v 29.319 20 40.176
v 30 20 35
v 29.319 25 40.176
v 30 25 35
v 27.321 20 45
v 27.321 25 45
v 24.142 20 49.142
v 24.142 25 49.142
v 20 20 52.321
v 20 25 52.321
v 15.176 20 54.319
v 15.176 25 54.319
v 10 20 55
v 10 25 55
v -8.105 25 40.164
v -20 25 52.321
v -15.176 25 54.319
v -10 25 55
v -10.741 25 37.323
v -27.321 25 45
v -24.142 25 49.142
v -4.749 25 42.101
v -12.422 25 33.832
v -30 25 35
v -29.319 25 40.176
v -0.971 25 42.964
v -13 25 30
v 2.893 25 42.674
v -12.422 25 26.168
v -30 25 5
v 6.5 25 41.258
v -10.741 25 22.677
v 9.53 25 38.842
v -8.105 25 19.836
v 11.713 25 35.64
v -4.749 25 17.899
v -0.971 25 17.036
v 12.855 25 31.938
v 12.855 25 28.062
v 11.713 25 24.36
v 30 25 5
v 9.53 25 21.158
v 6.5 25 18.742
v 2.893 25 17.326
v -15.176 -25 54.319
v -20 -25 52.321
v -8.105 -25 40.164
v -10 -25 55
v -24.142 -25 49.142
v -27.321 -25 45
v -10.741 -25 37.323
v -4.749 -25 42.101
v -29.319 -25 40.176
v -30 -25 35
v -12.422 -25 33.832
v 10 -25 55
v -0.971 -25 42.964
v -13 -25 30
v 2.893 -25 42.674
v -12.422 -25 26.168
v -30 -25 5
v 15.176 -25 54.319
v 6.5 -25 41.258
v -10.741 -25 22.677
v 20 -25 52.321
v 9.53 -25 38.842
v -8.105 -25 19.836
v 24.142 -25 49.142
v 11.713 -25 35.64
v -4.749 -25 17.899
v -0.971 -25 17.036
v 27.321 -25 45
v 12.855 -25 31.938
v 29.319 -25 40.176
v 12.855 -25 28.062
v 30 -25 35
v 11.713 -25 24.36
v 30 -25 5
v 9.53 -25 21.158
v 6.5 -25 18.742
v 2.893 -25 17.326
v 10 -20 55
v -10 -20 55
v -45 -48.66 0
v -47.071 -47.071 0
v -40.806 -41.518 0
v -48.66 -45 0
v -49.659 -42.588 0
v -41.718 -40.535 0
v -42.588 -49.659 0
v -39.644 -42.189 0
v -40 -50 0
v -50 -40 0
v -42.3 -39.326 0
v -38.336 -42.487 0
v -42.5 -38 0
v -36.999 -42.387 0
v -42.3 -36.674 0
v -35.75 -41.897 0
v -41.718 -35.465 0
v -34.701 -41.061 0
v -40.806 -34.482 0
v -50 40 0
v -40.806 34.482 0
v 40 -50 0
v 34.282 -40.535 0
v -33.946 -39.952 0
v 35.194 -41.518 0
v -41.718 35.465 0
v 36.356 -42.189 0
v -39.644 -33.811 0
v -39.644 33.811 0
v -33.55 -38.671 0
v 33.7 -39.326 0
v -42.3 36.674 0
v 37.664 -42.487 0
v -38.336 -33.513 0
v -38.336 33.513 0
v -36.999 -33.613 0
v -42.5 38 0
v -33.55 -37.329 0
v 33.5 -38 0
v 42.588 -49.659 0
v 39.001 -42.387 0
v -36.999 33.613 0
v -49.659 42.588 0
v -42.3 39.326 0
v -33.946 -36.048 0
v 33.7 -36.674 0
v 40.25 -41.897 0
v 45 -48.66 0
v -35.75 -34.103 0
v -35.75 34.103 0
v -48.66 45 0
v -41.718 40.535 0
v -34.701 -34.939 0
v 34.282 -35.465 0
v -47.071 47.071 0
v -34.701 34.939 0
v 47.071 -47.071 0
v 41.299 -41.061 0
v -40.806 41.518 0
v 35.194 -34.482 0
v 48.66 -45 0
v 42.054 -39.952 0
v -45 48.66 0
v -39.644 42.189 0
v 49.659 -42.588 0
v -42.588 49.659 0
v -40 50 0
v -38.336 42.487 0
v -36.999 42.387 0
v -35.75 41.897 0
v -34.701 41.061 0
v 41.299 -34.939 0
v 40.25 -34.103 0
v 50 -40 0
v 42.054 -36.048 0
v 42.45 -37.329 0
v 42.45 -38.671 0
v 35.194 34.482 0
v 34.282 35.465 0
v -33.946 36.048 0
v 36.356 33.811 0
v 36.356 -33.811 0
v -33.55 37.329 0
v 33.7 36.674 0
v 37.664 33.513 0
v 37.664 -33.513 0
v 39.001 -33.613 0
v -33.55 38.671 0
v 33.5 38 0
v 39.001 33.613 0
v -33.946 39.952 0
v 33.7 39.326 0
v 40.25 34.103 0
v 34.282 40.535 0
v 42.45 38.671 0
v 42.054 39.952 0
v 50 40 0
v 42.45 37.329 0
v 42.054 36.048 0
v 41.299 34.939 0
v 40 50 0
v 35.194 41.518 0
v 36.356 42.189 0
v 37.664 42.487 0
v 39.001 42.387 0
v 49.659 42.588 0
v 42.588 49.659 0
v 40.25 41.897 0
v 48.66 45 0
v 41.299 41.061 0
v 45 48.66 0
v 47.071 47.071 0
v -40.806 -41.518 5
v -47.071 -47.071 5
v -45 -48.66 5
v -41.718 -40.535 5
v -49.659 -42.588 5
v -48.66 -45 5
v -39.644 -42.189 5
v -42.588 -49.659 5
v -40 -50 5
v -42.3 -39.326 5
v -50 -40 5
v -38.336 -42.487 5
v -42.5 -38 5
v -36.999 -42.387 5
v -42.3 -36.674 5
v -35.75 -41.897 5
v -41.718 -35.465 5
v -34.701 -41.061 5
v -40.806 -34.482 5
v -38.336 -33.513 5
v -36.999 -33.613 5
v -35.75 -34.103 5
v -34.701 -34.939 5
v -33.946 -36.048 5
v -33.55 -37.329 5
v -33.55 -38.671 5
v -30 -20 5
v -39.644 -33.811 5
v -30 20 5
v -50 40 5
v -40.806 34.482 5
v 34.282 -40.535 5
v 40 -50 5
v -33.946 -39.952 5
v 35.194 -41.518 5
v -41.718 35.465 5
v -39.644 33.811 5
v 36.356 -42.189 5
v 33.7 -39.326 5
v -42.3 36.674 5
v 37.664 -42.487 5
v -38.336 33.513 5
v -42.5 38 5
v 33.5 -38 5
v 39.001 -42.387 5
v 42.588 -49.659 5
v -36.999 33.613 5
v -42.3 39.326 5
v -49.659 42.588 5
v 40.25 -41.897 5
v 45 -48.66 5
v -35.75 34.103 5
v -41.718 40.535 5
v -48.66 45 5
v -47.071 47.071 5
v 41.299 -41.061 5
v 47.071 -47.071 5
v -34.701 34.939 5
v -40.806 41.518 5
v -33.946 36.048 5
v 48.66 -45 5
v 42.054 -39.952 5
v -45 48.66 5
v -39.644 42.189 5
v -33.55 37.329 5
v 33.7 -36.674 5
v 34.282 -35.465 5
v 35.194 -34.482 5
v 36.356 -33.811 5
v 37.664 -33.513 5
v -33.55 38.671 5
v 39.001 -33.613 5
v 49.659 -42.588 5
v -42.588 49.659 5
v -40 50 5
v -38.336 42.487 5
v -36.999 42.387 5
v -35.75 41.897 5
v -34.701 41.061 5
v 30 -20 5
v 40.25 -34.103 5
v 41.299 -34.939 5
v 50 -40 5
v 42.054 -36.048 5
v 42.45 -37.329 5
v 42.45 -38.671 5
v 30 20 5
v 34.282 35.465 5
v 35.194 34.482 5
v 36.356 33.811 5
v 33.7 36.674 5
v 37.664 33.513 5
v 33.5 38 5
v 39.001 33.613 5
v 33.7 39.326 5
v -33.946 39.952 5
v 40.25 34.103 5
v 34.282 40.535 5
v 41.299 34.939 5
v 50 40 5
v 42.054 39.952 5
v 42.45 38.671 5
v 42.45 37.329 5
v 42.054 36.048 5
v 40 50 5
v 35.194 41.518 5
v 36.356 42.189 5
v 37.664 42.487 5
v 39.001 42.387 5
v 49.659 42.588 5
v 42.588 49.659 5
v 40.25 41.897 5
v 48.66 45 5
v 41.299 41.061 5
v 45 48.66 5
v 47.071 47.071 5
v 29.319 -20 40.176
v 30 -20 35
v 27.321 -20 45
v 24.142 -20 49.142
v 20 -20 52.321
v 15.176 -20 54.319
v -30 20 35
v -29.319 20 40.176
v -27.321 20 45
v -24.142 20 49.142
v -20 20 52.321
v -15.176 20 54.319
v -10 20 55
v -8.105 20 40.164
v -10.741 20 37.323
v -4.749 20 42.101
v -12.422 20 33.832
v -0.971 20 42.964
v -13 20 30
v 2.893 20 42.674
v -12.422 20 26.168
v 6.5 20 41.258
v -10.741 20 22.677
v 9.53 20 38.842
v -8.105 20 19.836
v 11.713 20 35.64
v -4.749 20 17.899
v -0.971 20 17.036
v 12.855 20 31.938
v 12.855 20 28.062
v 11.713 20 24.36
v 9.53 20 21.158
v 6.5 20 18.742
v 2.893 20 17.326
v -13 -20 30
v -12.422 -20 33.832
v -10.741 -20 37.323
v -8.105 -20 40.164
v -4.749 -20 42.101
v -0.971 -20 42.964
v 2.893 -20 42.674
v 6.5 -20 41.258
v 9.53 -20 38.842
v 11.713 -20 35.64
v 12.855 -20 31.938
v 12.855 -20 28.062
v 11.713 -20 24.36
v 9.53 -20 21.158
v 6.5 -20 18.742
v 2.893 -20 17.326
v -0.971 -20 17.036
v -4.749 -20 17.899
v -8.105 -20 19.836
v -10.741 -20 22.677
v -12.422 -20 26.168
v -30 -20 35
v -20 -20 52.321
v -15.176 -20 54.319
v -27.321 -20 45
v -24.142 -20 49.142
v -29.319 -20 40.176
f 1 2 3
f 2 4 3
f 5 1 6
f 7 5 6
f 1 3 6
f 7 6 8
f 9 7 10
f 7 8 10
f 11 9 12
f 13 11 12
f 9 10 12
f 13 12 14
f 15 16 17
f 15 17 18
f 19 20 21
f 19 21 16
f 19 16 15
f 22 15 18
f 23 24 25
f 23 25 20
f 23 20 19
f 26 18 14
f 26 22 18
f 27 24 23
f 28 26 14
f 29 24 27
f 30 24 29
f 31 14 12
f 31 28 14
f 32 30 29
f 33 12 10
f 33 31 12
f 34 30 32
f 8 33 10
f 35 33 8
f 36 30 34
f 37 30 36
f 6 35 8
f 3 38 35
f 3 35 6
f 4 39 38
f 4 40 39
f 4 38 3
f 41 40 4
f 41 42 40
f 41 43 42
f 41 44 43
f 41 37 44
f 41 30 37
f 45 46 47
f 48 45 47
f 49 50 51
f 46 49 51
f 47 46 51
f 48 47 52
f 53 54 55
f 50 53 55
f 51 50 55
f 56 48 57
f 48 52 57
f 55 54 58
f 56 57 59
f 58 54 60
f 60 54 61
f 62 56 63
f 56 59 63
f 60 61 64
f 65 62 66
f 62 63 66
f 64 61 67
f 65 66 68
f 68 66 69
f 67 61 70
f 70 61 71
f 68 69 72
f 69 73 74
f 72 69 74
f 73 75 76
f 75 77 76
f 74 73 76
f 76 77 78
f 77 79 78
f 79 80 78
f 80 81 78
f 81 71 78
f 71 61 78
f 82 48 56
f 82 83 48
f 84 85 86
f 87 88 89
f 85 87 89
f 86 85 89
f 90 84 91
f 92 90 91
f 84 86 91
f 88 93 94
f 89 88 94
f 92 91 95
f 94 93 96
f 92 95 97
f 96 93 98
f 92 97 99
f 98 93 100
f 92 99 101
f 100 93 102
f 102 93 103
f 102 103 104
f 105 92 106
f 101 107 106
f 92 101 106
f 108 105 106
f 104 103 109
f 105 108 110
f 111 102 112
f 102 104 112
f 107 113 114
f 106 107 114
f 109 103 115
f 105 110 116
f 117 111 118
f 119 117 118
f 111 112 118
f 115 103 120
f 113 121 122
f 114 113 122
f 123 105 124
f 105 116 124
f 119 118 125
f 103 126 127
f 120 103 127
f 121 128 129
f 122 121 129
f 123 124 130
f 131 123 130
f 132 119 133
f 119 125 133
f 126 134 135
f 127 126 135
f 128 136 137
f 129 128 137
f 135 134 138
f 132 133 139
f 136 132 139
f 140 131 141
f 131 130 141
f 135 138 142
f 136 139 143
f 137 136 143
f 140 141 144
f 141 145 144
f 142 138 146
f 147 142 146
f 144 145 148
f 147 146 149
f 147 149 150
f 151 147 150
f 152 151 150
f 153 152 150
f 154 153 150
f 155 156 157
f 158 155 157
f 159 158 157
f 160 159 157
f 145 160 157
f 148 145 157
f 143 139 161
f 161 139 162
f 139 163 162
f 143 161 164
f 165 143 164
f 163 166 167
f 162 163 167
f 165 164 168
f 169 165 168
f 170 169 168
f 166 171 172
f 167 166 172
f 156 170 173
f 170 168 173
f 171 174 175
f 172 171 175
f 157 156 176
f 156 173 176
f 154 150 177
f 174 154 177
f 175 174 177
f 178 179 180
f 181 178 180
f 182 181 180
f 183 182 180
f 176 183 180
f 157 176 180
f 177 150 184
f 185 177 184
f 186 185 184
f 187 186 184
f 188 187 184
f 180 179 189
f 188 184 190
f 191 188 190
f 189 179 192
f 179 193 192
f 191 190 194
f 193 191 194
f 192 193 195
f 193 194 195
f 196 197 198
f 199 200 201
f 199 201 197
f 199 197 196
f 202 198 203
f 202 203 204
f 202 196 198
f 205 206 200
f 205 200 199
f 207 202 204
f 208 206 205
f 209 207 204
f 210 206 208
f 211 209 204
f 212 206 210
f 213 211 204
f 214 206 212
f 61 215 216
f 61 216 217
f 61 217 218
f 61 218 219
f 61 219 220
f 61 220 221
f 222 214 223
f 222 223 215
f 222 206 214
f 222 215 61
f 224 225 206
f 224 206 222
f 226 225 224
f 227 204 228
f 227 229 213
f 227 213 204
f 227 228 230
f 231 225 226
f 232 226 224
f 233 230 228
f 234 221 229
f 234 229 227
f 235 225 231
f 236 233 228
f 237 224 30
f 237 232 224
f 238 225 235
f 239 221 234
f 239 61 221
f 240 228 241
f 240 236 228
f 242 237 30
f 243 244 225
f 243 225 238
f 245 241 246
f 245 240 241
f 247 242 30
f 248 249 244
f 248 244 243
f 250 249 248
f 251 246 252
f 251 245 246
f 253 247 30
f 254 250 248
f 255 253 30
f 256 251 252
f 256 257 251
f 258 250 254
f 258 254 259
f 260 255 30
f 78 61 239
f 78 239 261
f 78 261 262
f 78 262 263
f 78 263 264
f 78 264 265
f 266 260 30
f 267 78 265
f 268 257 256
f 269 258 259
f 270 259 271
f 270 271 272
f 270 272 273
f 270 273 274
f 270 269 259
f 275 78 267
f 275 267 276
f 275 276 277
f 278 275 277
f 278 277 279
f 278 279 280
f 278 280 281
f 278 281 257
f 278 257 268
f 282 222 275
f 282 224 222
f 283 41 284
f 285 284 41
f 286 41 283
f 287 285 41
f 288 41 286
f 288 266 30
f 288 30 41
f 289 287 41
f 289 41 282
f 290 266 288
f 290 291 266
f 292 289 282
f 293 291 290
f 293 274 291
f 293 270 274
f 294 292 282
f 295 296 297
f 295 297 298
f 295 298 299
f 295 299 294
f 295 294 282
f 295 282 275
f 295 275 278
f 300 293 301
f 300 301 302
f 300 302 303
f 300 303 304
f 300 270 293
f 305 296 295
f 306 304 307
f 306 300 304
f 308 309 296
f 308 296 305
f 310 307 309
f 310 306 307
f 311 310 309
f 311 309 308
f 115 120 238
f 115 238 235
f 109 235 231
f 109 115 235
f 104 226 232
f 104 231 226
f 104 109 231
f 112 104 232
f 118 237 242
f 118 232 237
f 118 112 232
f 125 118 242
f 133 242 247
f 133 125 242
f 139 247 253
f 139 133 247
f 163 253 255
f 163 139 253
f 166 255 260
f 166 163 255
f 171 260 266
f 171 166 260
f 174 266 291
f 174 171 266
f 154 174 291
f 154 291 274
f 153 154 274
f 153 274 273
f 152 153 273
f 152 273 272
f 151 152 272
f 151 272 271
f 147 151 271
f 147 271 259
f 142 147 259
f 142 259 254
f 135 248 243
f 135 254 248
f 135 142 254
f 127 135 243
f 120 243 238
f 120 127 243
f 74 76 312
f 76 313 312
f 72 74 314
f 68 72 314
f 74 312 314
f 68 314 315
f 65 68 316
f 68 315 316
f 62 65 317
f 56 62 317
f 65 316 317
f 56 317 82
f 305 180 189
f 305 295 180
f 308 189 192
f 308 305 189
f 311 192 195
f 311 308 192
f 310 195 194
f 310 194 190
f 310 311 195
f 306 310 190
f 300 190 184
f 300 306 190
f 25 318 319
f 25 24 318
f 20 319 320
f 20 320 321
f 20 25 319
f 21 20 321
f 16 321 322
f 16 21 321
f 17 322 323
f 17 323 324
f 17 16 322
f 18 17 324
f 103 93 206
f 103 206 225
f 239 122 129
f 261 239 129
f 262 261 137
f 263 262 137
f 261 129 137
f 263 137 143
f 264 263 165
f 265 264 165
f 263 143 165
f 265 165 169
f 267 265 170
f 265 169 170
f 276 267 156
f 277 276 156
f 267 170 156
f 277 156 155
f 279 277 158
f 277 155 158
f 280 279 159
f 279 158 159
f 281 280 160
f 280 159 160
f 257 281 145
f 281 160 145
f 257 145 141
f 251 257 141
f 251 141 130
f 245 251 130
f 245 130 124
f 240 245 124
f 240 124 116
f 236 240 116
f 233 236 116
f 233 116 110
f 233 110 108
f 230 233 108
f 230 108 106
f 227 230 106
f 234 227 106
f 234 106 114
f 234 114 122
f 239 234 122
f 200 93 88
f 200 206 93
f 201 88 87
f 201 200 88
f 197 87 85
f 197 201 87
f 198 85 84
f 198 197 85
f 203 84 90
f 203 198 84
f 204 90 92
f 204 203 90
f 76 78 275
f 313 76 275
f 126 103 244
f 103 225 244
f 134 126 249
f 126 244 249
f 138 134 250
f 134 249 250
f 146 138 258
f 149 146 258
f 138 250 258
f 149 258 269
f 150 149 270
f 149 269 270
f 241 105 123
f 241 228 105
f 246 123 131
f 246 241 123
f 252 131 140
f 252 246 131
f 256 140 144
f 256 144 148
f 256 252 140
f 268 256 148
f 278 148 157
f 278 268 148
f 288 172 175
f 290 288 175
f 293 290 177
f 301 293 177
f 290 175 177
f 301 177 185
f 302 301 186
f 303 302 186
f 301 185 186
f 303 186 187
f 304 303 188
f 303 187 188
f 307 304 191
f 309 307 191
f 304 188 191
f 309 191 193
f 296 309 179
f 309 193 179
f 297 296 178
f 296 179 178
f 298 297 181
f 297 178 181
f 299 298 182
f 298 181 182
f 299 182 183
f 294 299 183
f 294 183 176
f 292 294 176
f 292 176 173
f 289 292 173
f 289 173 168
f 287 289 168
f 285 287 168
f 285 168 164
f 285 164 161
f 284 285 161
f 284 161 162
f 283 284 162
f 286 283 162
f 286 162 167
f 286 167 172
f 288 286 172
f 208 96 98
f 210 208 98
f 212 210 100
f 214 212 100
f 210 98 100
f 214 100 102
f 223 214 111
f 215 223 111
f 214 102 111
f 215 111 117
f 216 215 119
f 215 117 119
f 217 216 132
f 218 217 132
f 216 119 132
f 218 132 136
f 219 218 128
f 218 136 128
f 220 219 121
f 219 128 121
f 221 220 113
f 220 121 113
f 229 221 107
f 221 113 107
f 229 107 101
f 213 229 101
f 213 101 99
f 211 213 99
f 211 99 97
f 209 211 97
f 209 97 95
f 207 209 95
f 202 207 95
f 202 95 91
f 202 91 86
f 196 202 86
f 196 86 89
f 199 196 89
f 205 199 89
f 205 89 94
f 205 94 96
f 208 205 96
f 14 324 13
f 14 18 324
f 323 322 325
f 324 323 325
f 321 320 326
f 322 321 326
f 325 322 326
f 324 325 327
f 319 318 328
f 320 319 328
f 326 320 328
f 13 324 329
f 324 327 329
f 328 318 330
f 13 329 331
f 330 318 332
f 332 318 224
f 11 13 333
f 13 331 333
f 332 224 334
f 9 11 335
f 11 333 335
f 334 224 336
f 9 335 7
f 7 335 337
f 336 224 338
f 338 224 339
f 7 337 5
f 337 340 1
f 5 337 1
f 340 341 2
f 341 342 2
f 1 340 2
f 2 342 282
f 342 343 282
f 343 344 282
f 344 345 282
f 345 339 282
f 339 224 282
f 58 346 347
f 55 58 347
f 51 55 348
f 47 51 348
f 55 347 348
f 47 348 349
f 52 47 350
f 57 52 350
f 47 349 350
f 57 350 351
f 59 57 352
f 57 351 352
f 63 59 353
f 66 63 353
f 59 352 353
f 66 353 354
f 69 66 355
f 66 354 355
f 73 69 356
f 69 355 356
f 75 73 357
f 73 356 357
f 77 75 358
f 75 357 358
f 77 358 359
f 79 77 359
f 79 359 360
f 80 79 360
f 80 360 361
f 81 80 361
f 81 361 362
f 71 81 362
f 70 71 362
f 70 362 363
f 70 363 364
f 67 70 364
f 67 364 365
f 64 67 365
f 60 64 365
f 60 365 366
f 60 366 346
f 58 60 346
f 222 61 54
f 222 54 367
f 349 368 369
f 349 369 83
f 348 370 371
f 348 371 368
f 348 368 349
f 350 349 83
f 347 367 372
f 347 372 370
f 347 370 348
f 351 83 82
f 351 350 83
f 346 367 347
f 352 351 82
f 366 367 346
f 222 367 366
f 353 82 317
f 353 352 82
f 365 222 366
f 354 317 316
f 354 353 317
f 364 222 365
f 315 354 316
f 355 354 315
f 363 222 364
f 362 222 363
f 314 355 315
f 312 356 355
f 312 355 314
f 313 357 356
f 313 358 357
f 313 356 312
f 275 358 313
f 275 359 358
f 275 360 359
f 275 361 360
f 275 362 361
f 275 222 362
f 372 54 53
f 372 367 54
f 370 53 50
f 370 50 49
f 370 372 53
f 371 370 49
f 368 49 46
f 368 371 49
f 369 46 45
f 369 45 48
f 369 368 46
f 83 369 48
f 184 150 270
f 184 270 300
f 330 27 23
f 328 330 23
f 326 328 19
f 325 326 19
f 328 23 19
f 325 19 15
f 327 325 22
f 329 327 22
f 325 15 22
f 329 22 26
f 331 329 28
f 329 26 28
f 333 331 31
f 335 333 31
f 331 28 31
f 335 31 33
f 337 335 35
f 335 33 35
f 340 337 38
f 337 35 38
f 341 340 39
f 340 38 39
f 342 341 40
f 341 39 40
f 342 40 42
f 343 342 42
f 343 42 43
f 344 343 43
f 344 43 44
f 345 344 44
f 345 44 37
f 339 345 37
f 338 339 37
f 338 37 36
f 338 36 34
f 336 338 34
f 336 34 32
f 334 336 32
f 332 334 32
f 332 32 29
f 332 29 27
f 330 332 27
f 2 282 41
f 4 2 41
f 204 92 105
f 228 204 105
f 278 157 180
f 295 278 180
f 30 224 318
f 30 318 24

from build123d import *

# Parameters (mm, degrees)
F1_W     = 100
F1_H     = 100
F2_DEPTH = 5
F3_R     = 10
F5_D     = 9
F6_W     = 60
F6_H     = 5
F7_DEPTH = 50
F8_R     = 20
F10_D    = 26


# Not quite as in the source:
# - a pattern or mirror of a feature is missing from the dataset's text; its kind, count and spacing are read off the source's solid


with BuildPart() as f2:
    # F1 (on Top) → F2 (new body)
    with BuildSketch(Plane.XY):
        Rectangle(F1_W, F1_H)
    extrude(amount=F2_DEPTH)

    # F3
    f3_edges = [f2.edges().sort_by_distance(p)[0] for p in [
        (-50, 50, 2.5),
        (-50, -50, 2.5),
        (50, -50, 2.5),
        (50, 50, 2.5),
    ]]
    fillet(f3_edges, radius=F3_R)

    # F5 (through all)
    with Locations(Plane.XY.offset(5)):
        with Locations((-38, -38), (38, -38), (-38, -38), (38, 38)):
            f5 = Hole(F5_D / 2)

    # F5_copies: F5 across plane
    add(f5.mirror(Plane.ZX), mode=Mode.SUBTRACT)

    # F6 (on face) → F7 (join)
    with BuildSketch(Plane.XY.offset(5)):
        with Locations((0, -22.5)):
            Rectangle(F6_W, F6_H)
        with Locations((0, 22.5)):
            Rectangle(F6_W, F6_H)
    extrude(amount=F7_DEPTH)

    # F8
    f8_edges = [f2.edges().sort_by_distance(p)[0] for p in [
        (-30, -22.5, 55),
        (-30, 22.5, 55),
        (30, 22.5, 55),
        (30, -22.5, 55),
    ]]
    fillet(f8_edges, radius=F8_R)

    # F10 (through all)
    with Locations(Plane.XZ.offset(25)):
        with Locations((0, 30)):
            Hole(F10_D / 2)


solid = f2.part
